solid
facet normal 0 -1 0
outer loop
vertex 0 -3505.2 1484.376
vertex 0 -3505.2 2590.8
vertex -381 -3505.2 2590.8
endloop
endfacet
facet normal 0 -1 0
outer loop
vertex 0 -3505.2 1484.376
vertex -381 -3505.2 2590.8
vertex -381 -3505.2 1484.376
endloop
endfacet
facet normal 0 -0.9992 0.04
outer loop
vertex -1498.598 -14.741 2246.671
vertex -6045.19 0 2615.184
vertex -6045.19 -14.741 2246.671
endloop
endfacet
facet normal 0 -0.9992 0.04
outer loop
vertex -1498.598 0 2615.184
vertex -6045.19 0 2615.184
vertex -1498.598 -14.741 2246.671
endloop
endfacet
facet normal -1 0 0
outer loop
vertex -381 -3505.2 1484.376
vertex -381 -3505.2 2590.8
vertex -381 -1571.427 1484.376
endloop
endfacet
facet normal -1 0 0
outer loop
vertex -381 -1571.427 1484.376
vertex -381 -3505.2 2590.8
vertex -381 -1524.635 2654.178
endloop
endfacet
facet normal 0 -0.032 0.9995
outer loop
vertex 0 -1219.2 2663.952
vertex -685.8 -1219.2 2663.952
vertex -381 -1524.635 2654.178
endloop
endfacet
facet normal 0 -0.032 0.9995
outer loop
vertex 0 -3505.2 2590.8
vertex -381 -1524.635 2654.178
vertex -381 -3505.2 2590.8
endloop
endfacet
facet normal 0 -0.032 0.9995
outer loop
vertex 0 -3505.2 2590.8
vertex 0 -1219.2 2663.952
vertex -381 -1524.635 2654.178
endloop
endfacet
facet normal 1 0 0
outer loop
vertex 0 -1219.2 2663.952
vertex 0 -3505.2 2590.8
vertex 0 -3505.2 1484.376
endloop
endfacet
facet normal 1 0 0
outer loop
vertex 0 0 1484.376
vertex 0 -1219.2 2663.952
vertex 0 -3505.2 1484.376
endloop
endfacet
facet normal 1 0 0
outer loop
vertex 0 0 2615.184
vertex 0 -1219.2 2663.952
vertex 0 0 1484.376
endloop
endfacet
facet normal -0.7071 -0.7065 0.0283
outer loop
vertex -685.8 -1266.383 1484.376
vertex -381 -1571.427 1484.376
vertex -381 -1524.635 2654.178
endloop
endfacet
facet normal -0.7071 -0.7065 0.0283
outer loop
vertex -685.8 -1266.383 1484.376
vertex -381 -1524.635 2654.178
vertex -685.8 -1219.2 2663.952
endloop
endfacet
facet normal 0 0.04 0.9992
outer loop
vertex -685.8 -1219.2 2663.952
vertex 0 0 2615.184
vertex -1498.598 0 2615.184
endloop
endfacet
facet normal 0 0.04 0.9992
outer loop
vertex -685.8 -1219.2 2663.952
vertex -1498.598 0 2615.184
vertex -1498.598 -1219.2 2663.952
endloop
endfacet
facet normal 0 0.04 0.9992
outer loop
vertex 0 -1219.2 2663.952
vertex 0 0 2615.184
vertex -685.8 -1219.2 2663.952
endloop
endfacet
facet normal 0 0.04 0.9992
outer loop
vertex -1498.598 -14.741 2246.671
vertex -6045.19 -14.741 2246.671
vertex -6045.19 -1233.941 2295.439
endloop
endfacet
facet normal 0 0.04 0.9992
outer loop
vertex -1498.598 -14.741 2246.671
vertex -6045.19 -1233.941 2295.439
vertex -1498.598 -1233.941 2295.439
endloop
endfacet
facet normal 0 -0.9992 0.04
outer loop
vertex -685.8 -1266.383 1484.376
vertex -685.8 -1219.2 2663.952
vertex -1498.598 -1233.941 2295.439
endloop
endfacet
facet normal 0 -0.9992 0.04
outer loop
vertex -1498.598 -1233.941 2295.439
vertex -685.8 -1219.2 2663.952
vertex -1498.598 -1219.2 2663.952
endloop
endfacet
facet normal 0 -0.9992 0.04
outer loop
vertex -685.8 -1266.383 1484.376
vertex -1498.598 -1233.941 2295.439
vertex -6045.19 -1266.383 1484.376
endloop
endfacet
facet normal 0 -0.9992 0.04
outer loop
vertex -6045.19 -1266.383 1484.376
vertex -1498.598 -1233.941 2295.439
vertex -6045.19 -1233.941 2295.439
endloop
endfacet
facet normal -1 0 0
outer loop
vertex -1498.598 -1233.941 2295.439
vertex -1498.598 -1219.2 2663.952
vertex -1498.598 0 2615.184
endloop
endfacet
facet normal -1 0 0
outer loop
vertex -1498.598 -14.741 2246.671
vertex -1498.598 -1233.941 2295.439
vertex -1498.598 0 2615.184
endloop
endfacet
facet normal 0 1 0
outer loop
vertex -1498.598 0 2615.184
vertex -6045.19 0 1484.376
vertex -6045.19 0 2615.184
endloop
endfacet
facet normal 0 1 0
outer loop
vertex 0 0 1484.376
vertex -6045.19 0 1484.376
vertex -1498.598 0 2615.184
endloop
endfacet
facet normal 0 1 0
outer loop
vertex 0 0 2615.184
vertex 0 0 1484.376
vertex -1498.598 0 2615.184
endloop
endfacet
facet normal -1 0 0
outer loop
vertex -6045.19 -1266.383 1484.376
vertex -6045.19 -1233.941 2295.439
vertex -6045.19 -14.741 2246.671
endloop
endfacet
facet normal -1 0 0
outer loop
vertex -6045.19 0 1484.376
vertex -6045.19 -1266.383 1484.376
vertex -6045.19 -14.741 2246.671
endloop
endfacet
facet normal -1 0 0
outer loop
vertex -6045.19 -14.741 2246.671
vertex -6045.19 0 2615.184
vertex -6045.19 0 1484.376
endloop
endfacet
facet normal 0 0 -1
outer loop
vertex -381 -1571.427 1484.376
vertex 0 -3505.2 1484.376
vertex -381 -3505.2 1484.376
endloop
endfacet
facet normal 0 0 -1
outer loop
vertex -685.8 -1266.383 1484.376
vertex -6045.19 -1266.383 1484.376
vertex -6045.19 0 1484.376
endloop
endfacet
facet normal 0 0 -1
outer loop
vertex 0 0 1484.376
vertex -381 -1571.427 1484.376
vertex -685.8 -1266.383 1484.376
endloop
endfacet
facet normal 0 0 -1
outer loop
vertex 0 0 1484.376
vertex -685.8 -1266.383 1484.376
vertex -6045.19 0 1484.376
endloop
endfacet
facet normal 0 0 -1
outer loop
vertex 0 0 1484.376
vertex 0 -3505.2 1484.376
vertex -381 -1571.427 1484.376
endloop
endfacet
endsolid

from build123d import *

# Parameters (mm, degrees)
F2_DEPTH = 6045.18984
F4_DEPTH = 1270.0014057507
F5_W     = 4546.591872
F5_H     = 1220.1749701678
F6_DEPTH = 368.808


with BuildPart() as f2:
    # F0 (on Right) → F2 (new body)
    with BuildSketch(Plane.YZ):
        Polygon((-3505.2, 1484.376), (0, 1484.376), (0, 2615.184), (-1219.2, 2663.952), (-3505.2, 2590.8), align=None)
    extrude(amount=-F2_DEPTH)

    # F3 (on face) → F4 (cut, through all)
    with BuildSketch(Plane(origin=(0, 104.4402555911, 2611.0063897764), x_dir=(1, 0, 0), z_dir=(0, 0.0399680383, 0.9992009587))):
        Polygon((-685.8, -1324.6987445692), (-6045.18984, -1324.6987445692), (-6045.18984, -3610.6987445692), (-381, -3610.6987445692), (-381, -1629.4987445692), align=None)
    extrude(amount=-F4_DEPTH, mode=Mode.SUBTRACT)

    # F5 (on face) → F6 (cut)
    with BuildSketch(Plane(origin=(0, 104.4402555911, 2611.0063897764), x_dir=(1, 0, 0), z_dir=(0, 0.0399680383, 0.9992009587))):
        with Locations((-3771.893904, -714.6112594853)):
            Rectangle(F5_W, F5_H)
    extrude(amount=-F6_DEPTH, mode=Mode.SUBTRACT)


solid = f2.part
